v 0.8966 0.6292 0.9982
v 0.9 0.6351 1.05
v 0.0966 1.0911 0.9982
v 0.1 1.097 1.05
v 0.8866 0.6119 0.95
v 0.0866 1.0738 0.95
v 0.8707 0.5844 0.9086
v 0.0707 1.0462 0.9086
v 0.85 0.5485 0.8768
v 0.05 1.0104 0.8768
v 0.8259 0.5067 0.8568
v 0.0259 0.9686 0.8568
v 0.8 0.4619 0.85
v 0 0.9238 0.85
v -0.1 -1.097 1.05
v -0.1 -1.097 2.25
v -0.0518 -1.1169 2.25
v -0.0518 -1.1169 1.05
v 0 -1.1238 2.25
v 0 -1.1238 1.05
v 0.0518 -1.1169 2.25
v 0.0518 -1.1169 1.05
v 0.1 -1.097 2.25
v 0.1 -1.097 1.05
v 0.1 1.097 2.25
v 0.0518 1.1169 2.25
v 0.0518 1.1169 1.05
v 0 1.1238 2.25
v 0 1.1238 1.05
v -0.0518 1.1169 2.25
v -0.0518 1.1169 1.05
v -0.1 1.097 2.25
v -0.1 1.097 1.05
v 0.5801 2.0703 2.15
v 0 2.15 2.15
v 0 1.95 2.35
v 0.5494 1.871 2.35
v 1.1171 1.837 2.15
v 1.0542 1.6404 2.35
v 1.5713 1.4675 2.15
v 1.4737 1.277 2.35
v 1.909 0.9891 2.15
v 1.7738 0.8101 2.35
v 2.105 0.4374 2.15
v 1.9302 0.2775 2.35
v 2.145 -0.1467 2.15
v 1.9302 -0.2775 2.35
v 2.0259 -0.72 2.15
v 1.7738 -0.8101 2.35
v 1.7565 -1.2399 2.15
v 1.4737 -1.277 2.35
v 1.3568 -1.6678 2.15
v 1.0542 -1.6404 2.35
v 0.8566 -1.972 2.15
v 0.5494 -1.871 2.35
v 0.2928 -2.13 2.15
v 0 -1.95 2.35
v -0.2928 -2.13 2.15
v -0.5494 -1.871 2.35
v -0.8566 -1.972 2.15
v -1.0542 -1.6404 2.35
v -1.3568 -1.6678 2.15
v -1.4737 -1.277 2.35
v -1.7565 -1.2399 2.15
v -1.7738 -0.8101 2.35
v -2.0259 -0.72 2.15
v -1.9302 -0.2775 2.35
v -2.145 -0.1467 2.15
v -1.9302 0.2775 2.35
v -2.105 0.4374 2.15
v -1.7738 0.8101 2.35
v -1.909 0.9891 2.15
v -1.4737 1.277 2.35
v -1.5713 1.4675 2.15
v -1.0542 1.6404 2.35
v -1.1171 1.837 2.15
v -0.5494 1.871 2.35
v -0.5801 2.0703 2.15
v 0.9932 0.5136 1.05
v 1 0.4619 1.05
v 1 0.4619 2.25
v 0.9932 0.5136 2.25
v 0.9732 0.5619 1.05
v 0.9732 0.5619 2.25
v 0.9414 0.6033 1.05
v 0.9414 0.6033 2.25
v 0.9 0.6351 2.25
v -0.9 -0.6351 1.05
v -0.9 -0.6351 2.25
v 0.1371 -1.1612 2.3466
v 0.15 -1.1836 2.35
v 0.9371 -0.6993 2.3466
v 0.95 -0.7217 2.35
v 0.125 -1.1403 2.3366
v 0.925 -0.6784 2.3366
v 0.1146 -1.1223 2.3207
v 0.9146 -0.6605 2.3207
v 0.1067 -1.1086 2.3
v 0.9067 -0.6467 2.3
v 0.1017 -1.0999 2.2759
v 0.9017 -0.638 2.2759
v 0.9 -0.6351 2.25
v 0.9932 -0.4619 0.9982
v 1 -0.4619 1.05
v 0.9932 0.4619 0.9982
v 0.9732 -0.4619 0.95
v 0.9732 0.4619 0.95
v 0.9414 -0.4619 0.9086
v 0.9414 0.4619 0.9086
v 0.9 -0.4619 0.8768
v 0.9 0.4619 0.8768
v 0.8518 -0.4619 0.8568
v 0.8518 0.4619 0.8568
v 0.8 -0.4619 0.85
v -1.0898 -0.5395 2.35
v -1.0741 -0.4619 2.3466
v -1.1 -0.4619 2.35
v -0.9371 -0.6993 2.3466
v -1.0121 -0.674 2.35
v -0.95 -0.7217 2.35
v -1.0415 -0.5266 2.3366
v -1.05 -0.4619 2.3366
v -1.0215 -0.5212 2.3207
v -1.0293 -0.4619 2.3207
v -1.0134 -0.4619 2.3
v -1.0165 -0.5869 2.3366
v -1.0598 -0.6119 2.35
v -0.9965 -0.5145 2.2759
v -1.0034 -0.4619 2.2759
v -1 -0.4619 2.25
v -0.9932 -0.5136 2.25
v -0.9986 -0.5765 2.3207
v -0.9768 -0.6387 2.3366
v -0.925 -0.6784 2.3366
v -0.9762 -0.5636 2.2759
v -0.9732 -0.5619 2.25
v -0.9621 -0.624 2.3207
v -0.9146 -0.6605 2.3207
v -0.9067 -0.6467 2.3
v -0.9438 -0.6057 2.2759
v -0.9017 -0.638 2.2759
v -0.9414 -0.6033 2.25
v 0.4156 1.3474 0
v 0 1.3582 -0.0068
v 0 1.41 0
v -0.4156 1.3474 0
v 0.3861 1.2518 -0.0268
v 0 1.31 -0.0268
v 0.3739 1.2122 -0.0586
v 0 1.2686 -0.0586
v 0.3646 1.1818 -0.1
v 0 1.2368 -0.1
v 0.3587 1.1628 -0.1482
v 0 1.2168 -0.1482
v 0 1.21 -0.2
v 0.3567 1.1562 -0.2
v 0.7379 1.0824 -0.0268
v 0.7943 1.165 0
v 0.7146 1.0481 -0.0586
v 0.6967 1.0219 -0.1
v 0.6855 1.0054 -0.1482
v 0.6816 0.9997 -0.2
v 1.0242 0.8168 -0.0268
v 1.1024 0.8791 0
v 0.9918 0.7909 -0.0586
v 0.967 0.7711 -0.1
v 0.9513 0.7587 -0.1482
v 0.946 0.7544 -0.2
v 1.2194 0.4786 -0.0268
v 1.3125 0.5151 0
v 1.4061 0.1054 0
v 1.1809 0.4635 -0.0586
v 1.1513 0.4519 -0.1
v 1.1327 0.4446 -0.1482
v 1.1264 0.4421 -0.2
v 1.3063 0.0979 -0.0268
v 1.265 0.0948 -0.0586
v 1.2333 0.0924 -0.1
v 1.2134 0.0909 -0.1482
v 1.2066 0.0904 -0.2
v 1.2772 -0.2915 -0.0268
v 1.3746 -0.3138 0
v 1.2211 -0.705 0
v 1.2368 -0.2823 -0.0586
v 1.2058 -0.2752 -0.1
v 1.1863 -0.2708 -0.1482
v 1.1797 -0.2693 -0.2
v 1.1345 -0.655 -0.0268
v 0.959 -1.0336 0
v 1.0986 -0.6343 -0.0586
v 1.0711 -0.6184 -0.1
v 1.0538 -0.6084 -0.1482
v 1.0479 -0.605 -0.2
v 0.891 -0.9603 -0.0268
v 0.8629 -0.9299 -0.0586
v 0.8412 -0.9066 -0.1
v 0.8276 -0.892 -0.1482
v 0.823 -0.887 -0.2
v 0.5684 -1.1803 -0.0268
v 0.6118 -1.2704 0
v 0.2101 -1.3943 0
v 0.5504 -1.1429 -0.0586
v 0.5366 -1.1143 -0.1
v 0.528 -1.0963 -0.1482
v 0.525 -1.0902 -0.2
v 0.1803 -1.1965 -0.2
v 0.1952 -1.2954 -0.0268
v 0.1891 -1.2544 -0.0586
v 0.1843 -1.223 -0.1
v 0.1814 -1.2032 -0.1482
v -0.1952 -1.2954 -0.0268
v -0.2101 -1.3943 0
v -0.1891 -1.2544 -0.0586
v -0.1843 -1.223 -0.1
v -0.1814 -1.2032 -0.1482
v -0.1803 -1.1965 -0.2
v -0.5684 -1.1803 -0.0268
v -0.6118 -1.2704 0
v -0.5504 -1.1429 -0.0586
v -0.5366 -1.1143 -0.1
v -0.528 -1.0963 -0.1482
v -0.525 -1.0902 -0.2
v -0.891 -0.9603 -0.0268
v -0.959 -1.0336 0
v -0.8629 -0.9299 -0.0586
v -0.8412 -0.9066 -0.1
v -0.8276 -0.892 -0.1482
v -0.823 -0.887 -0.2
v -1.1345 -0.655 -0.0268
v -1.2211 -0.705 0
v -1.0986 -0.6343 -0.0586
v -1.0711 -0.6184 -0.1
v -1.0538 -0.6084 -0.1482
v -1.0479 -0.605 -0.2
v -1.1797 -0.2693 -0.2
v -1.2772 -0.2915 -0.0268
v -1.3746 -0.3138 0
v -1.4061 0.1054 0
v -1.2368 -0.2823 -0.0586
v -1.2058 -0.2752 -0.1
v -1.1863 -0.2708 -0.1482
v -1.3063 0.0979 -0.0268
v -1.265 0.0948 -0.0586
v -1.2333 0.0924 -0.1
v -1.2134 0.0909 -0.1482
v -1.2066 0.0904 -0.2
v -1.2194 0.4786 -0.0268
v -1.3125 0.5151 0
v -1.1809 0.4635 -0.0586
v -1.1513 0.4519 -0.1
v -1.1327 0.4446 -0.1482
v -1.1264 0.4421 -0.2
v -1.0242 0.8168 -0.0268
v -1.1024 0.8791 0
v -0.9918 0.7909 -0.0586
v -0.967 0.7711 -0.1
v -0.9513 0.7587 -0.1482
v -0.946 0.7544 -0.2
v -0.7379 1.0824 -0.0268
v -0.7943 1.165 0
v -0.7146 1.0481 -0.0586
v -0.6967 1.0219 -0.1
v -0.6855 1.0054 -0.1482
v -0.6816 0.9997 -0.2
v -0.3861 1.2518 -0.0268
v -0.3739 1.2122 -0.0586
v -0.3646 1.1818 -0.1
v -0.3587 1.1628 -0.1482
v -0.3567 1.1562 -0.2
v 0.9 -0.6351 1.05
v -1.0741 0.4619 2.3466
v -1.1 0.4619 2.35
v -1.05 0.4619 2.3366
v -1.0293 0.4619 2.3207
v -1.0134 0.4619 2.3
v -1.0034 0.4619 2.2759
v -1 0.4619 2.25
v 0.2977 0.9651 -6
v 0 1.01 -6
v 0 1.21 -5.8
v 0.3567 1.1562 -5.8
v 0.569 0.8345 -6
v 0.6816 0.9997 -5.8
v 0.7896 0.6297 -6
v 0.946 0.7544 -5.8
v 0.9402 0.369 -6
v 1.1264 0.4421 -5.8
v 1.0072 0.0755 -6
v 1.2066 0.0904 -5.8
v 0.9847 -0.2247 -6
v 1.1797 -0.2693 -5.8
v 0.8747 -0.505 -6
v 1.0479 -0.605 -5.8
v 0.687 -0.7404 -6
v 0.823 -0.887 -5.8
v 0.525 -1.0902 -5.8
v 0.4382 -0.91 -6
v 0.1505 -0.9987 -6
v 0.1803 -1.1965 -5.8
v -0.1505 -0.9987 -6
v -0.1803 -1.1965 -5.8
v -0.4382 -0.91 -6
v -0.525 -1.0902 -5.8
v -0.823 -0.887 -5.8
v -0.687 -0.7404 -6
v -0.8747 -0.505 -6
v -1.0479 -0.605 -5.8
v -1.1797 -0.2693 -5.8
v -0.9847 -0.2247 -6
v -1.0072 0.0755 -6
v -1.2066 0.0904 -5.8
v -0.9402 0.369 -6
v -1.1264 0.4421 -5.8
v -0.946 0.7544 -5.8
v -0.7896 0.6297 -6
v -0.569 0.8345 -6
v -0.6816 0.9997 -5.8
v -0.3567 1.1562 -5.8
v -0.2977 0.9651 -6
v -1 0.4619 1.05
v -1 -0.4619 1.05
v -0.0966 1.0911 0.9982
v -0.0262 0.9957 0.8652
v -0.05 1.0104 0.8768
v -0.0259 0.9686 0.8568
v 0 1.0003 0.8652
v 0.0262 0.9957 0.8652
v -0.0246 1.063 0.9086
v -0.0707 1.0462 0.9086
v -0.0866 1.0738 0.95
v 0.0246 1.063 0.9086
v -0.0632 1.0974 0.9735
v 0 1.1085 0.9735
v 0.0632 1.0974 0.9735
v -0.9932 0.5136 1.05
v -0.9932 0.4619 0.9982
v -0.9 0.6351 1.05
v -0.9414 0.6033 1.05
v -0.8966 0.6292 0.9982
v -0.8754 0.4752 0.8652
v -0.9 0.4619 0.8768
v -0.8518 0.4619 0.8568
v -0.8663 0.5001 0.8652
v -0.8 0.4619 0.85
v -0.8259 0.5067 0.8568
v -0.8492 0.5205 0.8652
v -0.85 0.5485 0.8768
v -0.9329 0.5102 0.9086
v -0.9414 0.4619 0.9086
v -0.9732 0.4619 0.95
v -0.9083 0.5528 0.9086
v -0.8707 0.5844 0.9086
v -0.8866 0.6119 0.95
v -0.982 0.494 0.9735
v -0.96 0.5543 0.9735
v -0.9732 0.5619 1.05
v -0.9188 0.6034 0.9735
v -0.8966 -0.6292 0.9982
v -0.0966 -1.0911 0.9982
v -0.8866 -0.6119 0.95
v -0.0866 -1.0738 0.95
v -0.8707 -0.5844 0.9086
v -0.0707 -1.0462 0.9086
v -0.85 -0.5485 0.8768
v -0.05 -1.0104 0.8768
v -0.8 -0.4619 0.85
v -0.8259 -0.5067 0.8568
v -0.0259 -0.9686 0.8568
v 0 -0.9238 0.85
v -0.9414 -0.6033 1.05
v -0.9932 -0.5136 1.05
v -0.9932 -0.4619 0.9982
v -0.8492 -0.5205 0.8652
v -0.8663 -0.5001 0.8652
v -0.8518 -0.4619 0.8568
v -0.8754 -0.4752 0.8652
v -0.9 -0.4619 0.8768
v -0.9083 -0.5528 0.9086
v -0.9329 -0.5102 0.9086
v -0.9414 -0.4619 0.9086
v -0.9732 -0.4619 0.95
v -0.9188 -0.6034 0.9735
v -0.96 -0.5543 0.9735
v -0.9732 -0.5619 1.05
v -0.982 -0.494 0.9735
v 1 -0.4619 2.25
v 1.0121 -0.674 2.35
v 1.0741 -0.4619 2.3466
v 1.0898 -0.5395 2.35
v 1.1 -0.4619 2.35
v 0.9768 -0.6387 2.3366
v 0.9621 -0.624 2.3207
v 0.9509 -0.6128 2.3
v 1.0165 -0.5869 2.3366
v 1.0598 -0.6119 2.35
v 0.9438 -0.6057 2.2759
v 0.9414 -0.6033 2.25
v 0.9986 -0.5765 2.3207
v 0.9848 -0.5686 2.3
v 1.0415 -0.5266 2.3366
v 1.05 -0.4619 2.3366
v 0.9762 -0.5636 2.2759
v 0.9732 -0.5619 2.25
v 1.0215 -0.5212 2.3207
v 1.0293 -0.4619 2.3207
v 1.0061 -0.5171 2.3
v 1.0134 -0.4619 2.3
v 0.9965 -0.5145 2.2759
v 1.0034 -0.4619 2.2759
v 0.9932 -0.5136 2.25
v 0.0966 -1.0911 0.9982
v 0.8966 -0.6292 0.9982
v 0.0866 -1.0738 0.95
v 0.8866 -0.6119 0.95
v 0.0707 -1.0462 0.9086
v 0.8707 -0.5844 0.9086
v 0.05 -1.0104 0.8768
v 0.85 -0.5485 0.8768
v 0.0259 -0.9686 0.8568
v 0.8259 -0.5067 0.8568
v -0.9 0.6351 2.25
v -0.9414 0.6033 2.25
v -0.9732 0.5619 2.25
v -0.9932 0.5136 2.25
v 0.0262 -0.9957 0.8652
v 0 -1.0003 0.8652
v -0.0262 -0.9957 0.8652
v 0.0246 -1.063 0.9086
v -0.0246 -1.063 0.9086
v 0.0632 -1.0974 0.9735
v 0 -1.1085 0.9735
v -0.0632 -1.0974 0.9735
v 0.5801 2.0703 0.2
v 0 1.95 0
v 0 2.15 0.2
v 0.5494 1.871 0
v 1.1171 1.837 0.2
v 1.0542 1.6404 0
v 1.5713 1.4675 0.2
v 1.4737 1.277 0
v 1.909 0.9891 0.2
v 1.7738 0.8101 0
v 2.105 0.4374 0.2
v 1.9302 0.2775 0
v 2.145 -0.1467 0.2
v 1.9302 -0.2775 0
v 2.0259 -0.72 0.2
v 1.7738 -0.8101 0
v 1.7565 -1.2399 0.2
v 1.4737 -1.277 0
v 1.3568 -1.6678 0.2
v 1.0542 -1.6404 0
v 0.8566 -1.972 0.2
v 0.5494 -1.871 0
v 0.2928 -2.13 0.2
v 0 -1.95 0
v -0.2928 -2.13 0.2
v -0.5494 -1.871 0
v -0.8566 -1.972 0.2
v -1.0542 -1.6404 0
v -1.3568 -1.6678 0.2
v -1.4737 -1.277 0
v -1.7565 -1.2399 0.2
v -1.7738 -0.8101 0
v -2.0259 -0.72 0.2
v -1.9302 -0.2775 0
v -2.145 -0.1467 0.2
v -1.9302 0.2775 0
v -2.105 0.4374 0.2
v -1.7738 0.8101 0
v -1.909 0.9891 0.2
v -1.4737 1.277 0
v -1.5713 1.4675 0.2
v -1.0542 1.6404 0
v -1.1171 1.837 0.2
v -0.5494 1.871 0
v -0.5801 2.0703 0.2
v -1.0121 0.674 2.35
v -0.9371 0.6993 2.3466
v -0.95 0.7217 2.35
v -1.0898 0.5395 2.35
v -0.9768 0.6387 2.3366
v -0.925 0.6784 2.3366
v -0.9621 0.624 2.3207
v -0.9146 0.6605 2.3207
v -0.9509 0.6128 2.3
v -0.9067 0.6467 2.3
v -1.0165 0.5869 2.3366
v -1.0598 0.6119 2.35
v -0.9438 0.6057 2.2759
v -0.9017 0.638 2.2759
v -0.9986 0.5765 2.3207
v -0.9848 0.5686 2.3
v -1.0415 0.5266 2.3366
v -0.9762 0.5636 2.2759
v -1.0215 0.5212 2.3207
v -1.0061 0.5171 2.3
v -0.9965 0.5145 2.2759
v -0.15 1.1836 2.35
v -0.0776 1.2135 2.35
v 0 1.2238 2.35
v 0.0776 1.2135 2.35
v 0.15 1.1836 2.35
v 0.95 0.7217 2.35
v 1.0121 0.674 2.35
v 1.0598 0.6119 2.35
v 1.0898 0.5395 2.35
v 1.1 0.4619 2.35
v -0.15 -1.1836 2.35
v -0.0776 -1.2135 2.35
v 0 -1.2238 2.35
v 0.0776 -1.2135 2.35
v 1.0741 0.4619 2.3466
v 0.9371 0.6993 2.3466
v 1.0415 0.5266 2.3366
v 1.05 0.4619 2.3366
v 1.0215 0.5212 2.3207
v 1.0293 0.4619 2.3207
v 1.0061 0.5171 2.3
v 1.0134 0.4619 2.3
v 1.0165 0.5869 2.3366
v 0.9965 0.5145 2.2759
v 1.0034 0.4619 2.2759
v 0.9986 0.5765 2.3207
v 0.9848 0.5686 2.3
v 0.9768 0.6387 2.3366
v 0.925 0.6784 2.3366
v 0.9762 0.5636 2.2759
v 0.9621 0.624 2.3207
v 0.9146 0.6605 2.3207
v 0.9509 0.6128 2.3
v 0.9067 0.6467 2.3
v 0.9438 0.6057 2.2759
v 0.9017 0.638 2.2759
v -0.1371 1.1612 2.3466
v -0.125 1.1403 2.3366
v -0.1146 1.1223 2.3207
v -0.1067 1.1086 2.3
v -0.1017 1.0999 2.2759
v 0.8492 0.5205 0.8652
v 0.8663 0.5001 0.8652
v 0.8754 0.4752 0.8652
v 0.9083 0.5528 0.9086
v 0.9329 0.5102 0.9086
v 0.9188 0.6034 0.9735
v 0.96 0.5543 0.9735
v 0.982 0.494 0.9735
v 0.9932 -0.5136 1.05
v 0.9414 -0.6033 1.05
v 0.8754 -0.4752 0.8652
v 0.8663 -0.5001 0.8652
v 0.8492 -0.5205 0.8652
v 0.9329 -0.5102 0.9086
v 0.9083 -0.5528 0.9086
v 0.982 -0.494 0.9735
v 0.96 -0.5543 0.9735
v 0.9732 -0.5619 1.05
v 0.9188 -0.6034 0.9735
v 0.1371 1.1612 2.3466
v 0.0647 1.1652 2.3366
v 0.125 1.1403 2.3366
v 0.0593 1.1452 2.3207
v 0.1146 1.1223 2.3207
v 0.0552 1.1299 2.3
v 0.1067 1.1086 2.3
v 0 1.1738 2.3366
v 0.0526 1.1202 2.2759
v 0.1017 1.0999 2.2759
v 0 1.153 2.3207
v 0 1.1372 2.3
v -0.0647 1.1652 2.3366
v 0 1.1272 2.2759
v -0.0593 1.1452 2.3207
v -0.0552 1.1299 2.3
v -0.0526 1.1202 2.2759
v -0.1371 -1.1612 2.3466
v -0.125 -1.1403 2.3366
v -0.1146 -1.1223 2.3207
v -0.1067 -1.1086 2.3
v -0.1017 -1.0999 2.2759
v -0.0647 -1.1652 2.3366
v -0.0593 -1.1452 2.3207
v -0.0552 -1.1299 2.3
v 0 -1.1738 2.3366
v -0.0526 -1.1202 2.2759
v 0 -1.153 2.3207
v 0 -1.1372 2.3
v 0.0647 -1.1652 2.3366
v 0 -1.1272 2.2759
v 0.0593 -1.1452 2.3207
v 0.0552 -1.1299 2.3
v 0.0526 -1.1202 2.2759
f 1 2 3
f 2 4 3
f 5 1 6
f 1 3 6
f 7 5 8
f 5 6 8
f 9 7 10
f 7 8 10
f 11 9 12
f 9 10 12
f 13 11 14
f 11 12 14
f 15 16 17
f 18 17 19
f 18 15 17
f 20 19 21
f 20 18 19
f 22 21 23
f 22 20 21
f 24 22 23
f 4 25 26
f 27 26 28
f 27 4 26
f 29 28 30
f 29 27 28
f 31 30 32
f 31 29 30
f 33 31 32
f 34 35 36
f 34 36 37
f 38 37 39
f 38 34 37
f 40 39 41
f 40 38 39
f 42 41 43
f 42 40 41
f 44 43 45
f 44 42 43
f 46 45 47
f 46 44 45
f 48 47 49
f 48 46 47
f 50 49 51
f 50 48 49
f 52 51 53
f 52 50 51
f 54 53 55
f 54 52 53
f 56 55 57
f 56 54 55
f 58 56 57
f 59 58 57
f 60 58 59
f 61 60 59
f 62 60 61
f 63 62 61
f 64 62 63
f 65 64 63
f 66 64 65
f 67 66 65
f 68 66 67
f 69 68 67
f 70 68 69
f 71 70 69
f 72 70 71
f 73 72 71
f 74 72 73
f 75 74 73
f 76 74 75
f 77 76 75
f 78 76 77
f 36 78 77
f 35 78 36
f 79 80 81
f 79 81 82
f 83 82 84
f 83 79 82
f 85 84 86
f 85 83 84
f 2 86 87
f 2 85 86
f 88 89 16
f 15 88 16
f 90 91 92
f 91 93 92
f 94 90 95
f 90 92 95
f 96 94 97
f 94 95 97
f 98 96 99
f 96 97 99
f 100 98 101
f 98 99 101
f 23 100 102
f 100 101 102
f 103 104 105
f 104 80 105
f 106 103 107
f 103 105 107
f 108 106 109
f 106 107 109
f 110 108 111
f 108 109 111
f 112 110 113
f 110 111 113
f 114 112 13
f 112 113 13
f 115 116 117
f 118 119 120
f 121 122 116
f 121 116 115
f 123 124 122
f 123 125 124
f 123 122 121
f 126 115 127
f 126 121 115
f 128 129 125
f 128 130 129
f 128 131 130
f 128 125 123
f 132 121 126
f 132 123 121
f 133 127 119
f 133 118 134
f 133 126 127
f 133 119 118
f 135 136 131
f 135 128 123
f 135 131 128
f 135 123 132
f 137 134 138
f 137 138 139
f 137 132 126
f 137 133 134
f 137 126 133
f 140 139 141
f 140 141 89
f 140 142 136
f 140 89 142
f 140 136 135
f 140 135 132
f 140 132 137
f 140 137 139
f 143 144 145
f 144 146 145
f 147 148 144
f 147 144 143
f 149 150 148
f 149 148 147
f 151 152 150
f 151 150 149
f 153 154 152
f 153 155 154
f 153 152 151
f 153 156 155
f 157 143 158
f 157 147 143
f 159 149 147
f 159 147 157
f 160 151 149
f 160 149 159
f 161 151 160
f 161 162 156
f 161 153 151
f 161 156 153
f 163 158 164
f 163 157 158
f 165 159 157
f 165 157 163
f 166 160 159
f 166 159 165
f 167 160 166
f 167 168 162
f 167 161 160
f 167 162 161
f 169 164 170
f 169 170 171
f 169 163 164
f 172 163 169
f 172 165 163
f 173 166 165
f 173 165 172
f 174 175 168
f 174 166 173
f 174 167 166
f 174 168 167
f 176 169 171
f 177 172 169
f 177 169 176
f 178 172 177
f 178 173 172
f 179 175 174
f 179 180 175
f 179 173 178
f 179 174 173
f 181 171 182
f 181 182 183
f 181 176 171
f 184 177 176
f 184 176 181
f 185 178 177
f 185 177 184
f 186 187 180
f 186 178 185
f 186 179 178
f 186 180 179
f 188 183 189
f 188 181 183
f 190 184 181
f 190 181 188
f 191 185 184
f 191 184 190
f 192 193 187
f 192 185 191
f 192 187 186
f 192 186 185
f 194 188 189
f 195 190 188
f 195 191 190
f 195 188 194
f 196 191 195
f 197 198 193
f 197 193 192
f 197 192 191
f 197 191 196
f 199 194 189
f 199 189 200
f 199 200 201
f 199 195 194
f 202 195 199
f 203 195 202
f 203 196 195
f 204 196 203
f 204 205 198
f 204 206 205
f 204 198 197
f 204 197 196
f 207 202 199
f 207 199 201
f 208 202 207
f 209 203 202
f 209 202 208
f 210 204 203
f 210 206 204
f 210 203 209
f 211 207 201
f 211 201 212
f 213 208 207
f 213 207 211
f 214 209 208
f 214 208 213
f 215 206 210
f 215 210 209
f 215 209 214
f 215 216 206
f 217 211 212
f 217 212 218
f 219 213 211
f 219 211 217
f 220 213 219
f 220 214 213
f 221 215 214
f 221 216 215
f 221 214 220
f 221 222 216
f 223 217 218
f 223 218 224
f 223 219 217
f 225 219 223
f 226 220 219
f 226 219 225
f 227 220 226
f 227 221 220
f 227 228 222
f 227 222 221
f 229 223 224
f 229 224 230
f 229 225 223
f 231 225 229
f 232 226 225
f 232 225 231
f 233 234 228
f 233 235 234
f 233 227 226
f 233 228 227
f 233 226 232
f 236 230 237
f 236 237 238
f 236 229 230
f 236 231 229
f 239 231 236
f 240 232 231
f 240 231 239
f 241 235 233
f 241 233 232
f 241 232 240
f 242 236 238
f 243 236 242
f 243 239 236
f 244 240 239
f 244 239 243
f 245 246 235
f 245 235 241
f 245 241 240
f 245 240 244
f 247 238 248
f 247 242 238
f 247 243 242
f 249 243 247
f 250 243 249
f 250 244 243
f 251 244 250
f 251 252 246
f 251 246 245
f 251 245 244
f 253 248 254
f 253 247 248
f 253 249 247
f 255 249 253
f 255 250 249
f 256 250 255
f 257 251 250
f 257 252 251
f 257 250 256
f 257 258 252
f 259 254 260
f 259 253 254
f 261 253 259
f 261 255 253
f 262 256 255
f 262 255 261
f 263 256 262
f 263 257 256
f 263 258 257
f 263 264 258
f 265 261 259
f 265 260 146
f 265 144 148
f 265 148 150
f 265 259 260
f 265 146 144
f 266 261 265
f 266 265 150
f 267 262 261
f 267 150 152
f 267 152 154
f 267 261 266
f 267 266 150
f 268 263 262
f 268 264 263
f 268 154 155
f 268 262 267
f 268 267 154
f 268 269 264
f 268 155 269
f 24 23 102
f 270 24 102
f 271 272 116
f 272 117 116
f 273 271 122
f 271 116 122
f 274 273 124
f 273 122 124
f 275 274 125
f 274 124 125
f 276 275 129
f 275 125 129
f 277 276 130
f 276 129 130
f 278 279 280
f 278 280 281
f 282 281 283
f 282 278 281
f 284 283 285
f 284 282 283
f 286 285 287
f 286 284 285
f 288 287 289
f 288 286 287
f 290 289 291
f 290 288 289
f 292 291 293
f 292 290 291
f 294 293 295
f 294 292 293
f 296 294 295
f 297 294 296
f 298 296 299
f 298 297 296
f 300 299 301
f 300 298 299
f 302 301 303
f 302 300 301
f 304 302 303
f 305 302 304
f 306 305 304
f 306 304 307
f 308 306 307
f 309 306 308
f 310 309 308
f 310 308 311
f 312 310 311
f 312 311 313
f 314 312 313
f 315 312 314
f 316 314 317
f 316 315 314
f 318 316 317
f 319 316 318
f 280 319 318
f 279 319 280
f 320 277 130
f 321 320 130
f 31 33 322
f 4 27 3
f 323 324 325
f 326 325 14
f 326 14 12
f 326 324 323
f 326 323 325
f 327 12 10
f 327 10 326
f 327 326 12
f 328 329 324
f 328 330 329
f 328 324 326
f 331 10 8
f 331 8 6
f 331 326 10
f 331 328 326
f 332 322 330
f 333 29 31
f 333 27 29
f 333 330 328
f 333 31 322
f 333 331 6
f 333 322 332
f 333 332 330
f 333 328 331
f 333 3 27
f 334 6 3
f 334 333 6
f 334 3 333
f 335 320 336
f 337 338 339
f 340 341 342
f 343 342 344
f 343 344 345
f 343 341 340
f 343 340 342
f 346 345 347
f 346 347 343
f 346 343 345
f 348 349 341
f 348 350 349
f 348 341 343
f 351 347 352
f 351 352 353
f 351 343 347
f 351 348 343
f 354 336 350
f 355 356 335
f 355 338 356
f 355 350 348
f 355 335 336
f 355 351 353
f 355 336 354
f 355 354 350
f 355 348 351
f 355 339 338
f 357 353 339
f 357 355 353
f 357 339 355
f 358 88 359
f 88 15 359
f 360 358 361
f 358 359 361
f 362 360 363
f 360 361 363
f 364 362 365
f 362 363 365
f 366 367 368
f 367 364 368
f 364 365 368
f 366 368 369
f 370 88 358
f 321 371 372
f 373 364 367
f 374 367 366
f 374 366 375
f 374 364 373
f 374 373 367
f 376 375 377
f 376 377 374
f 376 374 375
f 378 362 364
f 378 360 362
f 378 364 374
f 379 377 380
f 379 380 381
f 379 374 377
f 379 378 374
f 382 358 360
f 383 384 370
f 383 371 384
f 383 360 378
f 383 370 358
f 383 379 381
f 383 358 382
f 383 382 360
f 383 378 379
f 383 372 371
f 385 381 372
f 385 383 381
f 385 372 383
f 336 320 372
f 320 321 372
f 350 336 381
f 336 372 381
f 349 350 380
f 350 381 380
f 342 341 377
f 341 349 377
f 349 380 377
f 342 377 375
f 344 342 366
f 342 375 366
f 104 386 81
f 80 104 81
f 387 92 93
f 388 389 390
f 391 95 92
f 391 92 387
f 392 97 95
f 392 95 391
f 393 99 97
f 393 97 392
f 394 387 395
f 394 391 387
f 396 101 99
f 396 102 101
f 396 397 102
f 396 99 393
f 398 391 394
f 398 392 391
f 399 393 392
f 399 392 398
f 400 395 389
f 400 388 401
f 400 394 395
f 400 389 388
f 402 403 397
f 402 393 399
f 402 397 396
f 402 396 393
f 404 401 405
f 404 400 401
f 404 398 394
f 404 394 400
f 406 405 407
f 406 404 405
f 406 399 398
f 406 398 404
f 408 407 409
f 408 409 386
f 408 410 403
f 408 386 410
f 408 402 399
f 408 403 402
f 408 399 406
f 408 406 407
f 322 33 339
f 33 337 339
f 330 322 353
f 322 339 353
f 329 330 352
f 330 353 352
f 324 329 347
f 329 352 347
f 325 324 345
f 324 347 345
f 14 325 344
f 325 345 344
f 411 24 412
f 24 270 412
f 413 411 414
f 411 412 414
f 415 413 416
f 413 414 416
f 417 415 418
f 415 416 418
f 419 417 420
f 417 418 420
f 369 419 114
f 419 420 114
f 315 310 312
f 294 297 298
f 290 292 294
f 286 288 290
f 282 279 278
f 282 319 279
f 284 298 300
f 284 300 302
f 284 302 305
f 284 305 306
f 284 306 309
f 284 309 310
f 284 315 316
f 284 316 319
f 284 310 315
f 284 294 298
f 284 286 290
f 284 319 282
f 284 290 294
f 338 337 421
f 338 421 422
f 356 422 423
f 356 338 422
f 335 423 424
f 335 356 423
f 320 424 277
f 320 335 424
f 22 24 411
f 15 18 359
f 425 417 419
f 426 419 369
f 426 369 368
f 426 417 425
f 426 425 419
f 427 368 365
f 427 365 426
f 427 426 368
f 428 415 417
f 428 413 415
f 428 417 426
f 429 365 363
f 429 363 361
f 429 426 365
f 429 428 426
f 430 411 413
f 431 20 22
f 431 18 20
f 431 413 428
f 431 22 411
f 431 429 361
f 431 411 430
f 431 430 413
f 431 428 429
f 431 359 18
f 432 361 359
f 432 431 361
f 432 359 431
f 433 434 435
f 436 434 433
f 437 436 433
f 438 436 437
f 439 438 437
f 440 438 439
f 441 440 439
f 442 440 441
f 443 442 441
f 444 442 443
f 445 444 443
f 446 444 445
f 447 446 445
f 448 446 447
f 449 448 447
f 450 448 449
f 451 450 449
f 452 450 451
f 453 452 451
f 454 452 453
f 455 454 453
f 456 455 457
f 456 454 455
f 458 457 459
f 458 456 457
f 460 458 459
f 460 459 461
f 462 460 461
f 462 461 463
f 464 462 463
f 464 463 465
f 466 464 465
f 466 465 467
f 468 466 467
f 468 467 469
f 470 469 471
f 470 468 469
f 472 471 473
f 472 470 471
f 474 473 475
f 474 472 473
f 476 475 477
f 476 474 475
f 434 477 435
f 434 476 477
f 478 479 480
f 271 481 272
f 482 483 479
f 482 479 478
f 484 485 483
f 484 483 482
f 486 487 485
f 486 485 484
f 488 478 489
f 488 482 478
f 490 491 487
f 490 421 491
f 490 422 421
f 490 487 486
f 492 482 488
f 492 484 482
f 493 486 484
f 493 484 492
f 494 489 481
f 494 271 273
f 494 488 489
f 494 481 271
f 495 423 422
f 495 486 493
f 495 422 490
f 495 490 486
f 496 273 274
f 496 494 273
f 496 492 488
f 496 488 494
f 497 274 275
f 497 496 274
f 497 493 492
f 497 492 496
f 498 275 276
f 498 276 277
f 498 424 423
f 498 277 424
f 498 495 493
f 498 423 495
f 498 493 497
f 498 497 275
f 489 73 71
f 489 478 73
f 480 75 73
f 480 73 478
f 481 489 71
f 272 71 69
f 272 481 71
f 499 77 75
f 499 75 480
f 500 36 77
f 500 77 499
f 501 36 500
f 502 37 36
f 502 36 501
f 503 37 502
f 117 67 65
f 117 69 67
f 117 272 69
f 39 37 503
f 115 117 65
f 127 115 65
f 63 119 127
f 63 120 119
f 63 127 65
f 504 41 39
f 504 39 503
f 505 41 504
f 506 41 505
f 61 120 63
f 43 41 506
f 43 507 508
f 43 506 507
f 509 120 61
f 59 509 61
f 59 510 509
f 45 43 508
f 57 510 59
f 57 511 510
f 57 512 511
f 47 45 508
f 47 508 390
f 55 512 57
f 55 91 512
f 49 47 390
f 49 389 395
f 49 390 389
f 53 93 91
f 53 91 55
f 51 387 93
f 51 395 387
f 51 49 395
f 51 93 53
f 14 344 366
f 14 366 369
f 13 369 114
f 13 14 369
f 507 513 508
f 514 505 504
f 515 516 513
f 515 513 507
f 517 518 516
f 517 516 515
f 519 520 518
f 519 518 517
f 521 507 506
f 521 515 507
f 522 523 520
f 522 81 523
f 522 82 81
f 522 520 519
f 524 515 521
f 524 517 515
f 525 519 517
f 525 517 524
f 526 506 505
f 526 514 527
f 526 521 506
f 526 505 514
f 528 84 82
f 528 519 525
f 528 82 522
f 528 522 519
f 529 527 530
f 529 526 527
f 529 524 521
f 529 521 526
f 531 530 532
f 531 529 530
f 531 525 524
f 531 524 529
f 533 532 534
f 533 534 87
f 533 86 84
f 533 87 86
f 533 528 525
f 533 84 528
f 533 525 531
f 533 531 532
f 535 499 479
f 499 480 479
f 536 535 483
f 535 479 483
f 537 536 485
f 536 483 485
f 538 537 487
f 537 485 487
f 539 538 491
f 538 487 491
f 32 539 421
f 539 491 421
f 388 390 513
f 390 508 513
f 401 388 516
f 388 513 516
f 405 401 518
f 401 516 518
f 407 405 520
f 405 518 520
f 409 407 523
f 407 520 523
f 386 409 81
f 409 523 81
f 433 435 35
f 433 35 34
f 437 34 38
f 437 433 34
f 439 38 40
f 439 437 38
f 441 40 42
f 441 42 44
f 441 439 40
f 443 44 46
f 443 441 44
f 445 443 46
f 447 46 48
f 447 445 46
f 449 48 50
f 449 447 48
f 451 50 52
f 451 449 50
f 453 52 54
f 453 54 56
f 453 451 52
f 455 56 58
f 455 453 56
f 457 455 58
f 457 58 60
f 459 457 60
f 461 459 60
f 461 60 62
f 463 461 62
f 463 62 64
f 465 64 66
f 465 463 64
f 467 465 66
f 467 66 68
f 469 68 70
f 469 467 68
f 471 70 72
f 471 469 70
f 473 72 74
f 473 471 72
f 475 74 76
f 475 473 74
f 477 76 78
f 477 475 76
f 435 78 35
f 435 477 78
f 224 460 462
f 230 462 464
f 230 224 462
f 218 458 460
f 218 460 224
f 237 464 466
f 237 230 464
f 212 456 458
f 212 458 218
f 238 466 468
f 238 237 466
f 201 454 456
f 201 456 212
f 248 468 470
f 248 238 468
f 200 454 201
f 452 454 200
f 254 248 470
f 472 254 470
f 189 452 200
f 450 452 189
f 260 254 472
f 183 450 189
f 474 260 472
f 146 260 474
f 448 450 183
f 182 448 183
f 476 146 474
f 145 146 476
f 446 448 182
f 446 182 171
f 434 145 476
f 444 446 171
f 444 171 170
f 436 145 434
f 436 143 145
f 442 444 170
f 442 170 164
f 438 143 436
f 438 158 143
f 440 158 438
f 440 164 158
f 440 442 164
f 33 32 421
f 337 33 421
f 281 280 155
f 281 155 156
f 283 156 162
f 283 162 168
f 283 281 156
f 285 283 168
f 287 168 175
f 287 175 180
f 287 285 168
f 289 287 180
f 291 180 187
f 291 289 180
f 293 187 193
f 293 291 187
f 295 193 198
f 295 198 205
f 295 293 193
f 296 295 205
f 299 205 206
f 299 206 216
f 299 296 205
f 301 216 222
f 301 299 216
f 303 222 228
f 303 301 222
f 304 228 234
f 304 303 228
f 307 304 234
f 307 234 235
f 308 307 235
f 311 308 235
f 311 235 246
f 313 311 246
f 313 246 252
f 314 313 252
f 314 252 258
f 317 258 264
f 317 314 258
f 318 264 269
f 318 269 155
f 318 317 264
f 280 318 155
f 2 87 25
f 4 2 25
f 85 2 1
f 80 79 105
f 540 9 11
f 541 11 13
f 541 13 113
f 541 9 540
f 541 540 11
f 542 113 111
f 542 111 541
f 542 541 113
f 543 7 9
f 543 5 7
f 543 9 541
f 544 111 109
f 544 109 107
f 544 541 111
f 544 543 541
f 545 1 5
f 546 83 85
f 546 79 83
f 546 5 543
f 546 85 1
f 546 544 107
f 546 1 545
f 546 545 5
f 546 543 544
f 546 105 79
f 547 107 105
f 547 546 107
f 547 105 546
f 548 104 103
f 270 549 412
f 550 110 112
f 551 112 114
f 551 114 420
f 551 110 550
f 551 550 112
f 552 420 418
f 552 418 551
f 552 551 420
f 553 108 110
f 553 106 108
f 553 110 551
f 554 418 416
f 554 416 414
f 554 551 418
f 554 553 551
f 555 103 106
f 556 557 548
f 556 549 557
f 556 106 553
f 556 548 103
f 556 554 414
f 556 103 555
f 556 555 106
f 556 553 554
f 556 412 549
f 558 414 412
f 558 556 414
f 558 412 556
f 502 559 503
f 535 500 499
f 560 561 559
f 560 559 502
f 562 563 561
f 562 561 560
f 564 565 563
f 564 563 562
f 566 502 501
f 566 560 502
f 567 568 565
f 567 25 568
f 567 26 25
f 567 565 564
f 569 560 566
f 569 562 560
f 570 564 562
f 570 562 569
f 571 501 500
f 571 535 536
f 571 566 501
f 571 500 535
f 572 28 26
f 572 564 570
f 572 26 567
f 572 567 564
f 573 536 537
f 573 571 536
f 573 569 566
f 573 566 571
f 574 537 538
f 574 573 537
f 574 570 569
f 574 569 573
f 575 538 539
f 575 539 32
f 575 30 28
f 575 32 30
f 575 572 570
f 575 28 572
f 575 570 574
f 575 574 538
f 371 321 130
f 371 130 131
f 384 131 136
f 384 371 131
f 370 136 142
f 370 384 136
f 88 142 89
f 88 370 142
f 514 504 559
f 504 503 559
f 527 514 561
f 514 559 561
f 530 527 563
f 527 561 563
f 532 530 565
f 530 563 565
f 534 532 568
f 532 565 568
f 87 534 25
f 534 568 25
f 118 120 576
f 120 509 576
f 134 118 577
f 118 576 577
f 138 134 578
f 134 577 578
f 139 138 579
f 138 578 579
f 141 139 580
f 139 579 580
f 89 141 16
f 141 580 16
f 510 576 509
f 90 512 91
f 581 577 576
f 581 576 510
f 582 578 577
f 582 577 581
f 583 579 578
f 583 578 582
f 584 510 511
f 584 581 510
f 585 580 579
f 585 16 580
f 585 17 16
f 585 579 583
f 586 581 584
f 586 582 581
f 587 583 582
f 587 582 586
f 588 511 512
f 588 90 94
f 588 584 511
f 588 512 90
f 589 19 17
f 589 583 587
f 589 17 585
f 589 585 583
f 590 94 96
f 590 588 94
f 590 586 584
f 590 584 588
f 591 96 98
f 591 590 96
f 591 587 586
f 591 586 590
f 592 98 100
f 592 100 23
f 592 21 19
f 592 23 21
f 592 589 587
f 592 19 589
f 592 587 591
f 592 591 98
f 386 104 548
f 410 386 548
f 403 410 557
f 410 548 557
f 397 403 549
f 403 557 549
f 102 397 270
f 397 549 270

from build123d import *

# Parameters (mm, degrees)
SCHNITT_LINEAR_AUSTRAGEN1_DEPTH = 1.5
FASE1_SIZE                      = 0.2
VERRUNDUNG1_R                   = 0.2
VERRUNDUNG2_R                   = 0.1


with BuildPart() as part:
    # Skizze1 → Rotation1 (revolve)
    with BuildSketch(Plane(origin=(0, 0, 0), x_dir=(0, 0, -1), z_dir=(1, 0, 0))):
        Polygon((-2.35, 0), (-2.35, 2.15), (0, 2.15), (0, 1.21), (6, 1.21), (6, 0), align=None)
    revolve(axis=Axis((0, 0, 21.919879518), (0, 0, -1)))

    # Skizze2 → Schnitt-Linear austragen1 (cut)
    with BuildSketch(Plane.XY.offset(2.35)):
        Polygon((1, -0.577350269), (1, 0.577350269), (0, 1.154700538), (-1, 0.577350269), (-1, -0.577350269), (0, -1.154700538), align=None)
    extrude(amount=-SCHNITT_LINEAR_AUSTRAGEN1_DEPTH, mode=Mode.SUBTRACT)

    # Fase1
    fase1_edges = [part.edges().sort_by_distance(p)[0] for p in [
        (0, -1.21, -6),
        (0, -2.15, 0),
        (0, -2.15, 2.35),
    ]]
    chamfer(fase1_edges, length=FASE1_SIZE)

    # Verrundung1
    verrundung1_edges = [part.edges().sort_by_distance(p)[0] for p in [
        (0.5, -0.866025404, 0.85),
        (1, -0.577350269, 1.6),
        (-0.5, -0.866025404, 0.85),
        (0, -1.154700538, 1.6),
        (-1, 0, 0.85),
        (-1, -0.577350269, 1.6),
        (-0.5, 0.866025404, 0.85),
        (-1, 0.577350269, 1.6),
        (0.5, 0.866025404, 0.85),
        (0, 1.154700538, 1.6),
        (1, 0, 0.85),
        (1, 0.577350269, 1.6),
        (0, -1.21, 0),
    ]]
    fillet(verrundung1_edges, radius=VERRUNDUNG1_R)

    # Verrundung2
    verrundung2_edges = [part.edges().sort_by_distance(p)[0] for p in [
        (-0.5, -0.866025404, 2.35),
        (-1, 0, 2.35),
        (-0.5, 0.866025404, 2.35),
        (0.5, 0.866025404, 2.35),
        (1, 0, 2.35),
        (0.5, -0.866025404, 2.35),
        (-0.973205081, -0.561880215, 2.35),
        (0, -1.123760431, 2.35),
        (0.973205081, -0.561880215, 2.35),
        (0.973205081, 0.561880215, 2.35),
        (0, 1.123760431, 2.35),
        (-0.973205081, 0.561880215, 2.35),
    ]]
    fillet(verrundung2_edges, radius=VERRUNDUNG2_R)


solid = part.part
